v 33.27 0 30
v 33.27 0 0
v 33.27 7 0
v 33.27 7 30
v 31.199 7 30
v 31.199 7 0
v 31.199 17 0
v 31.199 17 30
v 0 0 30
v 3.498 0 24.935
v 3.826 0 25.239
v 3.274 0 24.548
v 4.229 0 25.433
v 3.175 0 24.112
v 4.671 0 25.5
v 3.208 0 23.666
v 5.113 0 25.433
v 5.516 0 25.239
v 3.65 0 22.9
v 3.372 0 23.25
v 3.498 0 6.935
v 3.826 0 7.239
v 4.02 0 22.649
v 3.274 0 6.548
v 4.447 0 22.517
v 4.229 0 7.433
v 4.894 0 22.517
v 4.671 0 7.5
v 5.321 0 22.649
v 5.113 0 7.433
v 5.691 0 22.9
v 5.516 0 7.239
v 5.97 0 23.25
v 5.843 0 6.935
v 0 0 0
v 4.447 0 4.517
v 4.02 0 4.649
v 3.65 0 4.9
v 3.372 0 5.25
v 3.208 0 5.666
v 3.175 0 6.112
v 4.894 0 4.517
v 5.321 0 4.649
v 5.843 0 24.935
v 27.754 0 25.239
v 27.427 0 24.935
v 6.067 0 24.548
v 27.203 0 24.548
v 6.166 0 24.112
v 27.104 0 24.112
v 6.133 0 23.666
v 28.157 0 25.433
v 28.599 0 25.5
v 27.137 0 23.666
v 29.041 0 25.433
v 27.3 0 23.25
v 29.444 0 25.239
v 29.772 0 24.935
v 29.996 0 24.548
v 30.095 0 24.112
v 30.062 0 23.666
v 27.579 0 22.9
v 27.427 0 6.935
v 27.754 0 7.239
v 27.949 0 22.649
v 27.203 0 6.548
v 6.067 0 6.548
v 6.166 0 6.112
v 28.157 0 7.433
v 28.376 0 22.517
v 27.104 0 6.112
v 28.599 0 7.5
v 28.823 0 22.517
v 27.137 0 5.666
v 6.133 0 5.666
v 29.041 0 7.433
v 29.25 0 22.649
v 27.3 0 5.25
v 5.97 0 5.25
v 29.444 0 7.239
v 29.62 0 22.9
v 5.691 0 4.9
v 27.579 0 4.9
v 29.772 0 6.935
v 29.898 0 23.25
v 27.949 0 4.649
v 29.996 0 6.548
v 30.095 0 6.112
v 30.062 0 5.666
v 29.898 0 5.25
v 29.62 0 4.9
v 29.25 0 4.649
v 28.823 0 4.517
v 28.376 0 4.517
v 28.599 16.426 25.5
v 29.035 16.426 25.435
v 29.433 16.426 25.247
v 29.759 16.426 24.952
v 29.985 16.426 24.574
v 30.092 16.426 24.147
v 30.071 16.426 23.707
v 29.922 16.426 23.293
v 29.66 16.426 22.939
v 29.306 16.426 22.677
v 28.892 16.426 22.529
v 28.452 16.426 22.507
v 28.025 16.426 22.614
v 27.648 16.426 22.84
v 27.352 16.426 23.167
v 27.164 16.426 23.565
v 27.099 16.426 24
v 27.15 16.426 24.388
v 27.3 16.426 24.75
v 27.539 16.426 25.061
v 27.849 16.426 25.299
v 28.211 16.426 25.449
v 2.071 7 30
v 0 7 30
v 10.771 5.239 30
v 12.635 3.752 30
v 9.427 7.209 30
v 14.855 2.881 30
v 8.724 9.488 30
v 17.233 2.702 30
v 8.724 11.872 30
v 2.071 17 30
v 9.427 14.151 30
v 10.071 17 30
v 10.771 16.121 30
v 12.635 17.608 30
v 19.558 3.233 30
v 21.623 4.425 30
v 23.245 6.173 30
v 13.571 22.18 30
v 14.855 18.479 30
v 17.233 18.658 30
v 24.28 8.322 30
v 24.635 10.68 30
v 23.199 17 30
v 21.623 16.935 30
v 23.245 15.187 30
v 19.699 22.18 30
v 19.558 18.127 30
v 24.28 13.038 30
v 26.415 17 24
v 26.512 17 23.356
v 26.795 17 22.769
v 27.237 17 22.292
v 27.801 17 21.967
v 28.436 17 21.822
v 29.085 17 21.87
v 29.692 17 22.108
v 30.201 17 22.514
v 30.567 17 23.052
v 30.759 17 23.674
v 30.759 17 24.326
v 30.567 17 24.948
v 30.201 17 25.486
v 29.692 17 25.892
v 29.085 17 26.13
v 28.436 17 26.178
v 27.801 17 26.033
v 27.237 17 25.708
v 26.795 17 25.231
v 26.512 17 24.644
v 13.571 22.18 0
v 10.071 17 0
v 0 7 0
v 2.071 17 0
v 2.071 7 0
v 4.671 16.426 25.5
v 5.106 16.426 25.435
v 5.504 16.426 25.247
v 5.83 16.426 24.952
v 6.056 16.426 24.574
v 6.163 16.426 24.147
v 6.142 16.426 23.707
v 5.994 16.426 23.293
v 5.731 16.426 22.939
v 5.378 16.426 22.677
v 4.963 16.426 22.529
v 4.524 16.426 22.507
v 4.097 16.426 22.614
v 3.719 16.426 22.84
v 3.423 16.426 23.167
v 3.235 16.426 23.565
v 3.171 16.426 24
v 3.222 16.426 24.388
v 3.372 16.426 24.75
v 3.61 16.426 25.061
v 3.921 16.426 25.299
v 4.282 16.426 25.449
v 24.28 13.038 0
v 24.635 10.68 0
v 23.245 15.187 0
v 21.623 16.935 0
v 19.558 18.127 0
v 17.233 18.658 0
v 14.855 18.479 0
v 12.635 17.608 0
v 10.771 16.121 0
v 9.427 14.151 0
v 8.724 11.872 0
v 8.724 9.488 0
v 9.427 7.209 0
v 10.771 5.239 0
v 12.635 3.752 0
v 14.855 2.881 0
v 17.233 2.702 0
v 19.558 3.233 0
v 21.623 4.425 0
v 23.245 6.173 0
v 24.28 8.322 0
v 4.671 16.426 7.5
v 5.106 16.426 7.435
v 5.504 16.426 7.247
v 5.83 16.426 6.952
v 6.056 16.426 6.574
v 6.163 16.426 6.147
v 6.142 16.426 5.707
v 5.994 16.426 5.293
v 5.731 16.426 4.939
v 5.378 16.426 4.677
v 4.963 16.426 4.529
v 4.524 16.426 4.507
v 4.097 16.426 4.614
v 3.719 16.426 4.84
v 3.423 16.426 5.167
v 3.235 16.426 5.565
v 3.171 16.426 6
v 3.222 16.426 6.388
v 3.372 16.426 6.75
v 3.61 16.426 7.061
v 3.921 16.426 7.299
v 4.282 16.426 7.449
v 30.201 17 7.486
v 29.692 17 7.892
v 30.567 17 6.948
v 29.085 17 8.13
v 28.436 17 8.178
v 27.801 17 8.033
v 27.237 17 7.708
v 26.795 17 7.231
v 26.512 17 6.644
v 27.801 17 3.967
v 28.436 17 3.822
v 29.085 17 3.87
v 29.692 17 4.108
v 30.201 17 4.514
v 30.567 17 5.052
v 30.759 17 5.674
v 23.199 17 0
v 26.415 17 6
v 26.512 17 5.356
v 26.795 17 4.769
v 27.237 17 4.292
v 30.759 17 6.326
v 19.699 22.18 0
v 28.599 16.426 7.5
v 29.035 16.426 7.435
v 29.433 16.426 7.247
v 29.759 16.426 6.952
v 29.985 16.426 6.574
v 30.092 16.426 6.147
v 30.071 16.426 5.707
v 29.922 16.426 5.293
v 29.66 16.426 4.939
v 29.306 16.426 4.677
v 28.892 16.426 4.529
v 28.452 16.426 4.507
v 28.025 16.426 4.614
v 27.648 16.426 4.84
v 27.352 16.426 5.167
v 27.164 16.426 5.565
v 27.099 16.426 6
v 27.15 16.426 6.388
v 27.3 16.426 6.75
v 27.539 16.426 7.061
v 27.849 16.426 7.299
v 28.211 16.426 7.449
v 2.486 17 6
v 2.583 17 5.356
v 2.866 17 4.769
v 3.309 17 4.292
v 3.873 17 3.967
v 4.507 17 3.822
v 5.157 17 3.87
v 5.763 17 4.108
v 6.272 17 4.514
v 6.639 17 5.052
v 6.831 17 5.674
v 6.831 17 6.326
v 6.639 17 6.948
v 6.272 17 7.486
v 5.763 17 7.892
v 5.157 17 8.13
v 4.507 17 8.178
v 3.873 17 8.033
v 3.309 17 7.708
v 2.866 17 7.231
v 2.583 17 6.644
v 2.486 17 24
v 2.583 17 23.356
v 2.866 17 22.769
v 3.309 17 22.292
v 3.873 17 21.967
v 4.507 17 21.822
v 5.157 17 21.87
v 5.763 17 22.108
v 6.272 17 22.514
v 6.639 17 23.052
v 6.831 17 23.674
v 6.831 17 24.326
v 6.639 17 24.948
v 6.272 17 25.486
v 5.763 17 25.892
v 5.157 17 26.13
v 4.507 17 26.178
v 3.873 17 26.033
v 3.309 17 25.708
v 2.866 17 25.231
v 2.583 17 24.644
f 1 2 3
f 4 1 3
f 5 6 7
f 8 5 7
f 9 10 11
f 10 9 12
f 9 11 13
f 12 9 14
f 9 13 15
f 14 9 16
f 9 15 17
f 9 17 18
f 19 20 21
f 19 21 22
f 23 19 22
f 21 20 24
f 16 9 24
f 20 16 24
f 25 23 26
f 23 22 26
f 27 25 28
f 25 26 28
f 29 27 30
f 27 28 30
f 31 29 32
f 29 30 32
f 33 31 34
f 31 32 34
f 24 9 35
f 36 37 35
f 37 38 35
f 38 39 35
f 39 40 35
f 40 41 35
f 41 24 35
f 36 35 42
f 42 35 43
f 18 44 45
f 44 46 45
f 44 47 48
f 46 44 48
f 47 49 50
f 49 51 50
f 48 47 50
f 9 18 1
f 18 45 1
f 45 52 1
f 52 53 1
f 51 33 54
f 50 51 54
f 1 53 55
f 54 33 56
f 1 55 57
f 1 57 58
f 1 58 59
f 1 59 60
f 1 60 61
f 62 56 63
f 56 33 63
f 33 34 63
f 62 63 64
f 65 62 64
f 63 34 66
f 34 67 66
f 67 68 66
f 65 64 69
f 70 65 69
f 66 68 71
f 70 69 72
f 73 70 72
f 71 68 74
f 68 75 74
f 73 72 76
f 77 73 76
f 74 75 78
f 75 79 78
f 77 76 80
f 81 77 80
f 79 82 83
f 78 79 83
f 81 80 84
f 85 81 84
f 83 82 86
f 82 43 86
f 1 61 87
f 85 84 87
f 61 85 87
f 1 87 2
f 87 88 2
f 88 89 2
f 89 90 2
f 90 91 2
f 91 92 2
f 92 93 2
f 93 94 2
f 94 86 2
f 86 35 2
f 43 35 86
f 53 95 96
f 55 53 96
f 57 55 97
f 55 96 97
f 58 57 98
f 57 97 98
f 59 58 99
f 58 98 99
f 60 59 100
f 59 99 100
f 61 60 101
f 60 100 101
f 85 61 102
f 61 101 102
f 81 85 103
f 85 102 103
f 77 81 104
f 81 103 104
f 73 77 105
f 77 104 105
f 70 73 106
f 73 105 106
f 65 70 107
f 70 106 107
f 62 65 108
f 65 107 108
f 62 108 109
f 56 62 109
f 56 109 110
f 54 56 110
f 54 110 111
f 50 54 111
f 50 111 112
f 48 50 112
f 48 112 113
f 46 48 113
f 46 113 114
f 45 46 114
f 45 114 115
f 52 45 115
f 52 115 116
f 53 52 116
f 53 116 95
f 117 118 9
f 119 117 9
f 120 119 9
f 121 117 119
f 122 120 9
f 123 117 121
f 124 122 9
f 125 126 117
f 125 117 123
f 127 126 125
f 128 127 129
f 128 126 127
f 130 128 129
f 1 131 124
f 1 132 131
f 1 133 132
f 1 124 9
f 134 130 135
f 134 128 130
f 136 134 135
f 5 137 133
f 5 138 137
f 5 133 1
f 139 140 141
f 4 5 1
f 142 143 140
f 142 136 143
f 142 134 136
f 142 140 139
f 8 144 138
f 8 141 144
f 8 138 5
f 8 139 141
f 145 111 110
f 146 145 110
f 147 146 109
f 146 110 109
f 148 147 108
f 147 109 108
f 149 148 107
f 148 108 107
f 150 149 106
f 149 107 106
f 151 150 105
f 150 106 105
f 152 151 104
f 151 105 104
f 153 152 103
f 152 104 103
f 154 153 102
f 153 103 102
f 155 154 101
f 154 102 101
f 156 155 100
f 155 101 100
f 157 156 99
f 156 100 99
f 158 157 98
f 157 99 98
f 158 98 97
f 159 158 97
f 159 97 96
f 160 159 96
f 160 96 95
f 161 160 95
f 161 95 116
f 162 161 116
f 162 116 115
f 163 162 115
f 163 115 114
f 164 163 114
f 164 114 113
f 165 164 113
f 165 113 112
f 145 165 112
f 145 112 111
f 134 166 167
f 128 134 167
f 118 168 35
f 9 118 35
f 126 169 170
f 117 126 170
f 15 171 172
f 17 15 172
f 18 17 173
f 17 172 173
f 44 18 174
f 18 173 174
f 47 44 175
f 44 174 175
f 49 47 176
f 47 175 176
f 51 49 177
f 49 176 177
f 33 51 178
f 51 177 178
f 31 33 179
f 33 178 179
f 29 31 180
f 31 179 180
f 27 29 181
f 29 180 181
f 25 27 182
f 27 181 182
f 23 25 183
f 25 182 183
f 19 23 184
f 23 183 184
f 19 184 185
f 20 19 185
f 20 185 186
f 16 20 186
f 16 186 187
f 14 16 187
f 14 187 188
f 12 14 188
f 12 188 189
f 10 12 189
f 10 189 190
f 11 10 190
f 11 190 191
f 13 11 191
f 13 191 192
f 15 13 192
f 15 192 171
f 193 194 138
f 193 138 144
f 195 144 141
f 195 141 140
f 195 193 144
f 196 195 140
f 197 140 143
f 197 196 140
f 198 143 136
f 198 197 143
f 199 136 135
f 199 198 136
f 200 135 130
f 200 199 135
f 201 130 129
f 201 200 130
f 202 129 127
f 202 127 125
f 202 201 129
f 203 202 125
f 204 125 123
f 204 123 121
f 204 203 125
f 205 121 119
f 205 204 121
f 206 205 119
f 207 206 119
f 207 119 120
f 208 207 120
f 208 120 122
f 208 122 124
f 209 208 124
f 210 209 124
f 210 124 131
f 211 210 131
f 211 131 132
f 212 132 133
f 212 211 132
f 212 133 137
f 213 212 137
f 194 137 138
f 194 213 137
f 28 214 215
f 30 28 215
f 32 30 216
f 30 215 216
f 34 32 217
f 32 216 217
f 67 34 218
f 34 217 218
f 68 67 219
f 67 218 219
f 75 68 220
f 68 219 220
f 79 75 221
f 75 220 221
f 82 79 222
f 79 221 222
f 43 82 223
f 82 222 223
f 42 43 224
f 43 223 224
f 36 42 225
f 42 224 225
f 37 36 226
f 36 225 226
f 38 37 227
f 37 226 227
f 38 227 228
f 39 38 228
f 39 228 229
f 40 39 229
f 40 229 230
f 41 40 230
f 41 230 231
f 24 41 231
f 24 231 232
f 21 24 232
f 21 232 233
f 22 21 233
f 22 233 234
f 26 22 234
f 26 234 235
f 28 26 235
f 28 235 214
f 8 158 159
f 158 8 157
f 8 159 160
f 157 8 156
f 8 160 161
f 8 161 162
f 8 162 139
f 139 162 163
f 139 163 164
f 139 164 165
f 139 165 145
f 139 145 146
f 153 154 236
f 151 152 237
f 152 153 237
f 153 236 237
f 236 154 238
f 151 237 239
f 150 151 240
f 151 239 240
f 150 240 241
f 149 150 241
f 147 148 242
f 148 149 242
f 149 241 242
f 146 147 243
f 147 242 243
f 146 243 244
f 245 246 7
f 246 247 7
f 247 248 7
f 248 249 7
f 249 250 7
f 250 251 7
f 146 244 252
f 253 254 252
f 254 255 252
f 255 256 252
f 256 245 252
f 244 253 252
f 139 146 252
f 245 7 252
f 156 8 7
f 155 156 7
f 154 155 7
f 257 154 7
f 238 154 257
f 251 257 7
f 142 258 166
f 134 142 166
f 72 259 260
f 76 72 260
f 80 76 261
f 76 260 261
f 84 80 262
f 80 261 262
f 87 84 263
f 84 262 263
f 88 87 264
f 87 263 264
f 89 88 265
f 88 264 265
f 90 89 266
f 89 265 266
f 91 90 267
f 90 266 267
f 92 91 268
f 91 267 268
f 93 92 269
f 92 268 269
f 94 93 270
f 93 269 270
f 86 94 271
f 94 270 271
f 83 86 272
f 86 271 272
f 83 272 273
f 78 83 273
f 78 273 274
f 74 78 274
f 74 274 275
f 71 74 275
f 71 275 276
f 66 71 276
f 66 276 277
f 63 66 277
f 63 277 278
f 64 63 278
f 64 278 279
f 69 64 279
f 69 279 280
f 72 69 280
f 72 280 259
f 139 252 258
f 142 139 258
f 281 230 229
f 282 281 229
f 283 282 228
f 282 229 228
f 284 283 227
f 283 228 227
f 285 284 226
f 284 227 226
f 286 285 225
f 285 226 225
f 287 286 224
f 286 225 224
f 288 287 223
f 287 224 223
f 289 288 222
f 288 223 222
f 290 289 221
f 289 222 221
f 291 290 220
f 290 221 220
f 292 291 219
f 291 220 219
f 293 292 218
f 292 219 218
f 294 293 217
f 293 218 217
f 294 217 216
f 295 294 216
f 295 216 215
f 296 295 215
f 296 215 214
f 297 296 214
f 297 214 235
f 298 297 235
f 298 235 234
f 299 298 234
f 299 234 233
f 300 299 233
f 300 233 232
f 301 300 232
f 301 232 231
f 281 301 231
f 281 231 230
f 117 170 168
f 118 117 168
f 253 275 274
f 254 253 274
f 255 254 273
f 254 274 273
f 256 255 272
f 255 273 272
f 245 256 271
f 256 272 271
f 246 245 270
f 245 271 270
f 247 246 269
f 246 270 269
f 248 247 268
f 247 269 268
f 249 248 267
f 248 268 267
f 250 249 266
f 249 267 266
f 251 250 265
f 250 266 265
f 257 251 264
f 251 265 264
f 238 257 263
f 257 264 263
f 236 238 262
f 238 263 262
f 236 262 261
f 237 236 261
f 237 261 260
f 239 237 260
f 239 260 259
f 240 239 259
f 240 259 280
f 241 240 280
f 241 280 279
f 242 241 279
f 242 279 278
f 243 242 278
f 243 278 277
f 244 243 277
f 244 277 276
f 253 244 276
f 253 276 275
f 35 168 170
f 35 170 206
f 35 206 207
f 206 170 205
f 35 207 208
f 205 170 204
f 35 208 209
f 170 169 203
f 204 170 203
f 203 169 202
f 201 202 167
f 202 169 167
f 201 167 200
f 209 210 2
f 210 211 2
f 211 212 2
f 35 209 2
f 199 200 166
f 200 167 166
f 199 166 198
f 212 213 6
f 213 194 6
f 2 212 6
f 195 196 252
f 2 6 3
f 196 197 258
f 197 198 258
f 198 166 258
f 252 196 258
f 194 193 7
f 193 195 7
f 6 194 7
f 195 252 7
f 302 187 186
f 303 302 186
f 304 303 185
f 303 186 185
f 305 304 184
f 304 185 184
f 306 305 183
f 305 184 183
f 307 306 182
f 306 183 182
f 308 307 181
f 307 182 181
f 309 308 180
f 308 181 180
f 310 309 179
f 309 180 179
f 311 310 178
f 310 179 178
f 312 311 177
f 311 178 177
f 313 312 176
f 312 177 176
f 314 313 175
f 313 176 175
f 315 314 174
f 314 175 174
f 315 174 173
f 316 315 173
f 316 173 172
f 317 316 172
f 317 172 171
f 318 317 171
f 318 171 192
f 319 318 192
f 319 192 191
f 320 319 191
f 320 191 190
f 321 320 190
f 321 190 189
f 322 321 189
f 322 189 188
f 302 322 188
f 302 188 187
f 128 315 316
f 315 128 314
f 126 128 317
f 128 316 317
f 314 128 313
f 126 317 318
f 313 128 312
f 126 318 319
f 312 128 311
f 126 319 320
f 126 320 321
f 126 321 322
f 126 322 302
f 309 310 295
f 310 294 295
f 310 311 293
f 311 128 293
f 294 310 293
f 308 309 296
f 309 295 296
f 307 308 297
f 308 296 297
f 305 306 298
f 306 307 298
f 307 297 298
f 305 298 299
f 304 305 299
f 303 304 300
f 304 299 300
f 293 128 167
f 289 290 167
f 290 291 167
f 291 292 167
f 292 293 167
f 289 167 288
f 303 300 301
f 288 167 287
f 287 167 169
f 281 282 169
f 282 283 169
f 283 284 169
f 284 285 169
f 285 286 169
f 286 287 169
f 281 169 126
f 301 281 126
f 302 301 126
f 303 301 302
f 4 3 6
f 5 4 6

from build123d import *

# Parameters (mm, degrees)
SKETCH1_R                                         = 8
BOSS_EXTRUDE1_DEPTH                               = 30
SKETCH2_R                                         = 1.5
CUT_EXTRUDE2_DEPTH                                = 30
CSK_FOR_2_FLAT_HEAD_MACHINE_SCREW_100_D           = 2.7051
CSK_FOR_2_FLAT_HEAD_MACHINE_SCREW_100_CSINK_D     = 4.3688
CSK_FOR_2_FLAT_HEAD_MACHINE_SCREW_100_CSINK_ANGLE = 100
CSK_FOR_2_FLAT_HEAD_MACHINE_SCREW_2_D             = 2.7051
CSK_FOR_2_FLAT_HEAD_MACHINE_SCREW_2_CSINK_D       = 4.3688
CSK_FOR_2_FLAT_HEAD_MACHINE_SCREW_2_CSINK_ANGLE   = 100
CSK_FOR_2_FLAT_HEAD_MACHINE_SCREW_3_D             = 2.7051
CSK_FOR_2_FLAT_HEAD_MACHINE_SCREW_3_CSINK_D       = 4.3688
CSK_FOR_2_FLAT_HEAD_MACHINE_SCREW_3_CSINK_ANGLE   = 100
CSK_FOR_2_FLAT_HEAD_MACHINE_SCREW_4_D             = 2.7051
CSK_FOR_2_FLAT_HEAD_MACHINE_SCREW_4_CSINK_D       = 4.3688
CSK_FOR_2_FLAT_HEAD_MACHINE_SCREW_4_CSINK_ANGLE   = 100


with BuildPart() as part:
    # Sketch1 → Boss-Extrude1 (new body)
    with BuildSketch(Plane.XY):
        Polygon((33.27, 7), (31.19936412, 7), (31.19936412, 17), (23.19936412, 17), (19.69936412, 22.18), (13.57063588, 22.18), (10.07063588, 17), (2.07063588, 17), (2.07063588, 7), (0, 7), (0, 0), (33.27, 0), align=None)
        with Locations((16.635, 10.68)):
            Circle(SKETCH1_R, mode=Mode.SUBTRACT)
    extrude(amount=BOSS_EXTRUDE1_DEPTH)

    # Sketch2 → Cut-Extrude2 (cut)
    with BuildSketch(Plane(origin=(0, 17, 0), x_dir=(1, 0, 0), z_dir=(0, 1, 0))):
        with Locations(Location((28.59936412, -6, 0), (0, 0, 270))):
            Circle(SKETCH2_R)
        with Locations(Location((28.59936412, -24, 0), (0, 0, 270))):
            Circle(SKETCH2_R)
        with Locations(Location((4.67063588, -24, 0), (0, 0, 270))):
            Circle(SKETCH2_R)
        with Locations(Location((4.67063588, -6, 0), (0, 0, 270))):
            Circle(SKETCH2_R)
    extrude(amount=-CUT_EXTRUDE2_DEPTH, mode=Mode.SUBTRACT)

    # CSK for _2 Flat Head Machine Screw _100 (through all)
    with Locations(Plane(origin=(0, 17, 0), x_dir=(1, 0, 0), z_dir=(0, 1, 0))):
        with Locations((4.67063588, -6)):
            CounterSinkHole(CSK_FOR_2_FLAT_HEAD_MACHINE_SCREW_100_D / 2, CSK_FOR_2_FLAT_HEAD_MACHINE_SCREW_100_CSINK_D / 2, counter_sink_angle=CSK_FOR_2_FLAT_HEAD_MACHINE_SCREW_100_CSINK_ANGLE)

    # CSK for _2 Flat Head Machine Screw _ 2 (through all)
    with Locations(Plane(origin=(0, 17, 0), x_dir=(1, 0, 0), z_dir=(0, 1, 0))):
        with Locations((4.67063588, -24)):
            CounterSinkHole(CSK_FOR_2_FLAT_HEAD_MACHINE_SCREW_2_D / 2, CSK_FOR_2_FLAT_HEAD_MACHINE_SCREW_2_CSINK_D / 2, counter_sink_angle=CSK_FOR_2_FLAT_HEAD_MACHINE_SCREW_2_CSINK_ANGLE)

    # CSK for _2 Flat Head Machine Screw _ 3 (through all)
    with Locations(Plane(origin=(0, 17, 0), x_dir=(1, 0, 0), z_dir=(0, 1, 0))):
        with Locations((28.59936412, -6)):
            CounterSinkHole(CSK_FOR_2_FLAT_HEAD_MACHINE_SCREW_3_D / 2, CSK_FOR_2_FLAT_HEAD_MACHINE_SCREW_3_CSINK_D / 2, counter_sink_angle=CSK_FOR_2_FLAT_HEAD_MACHINE_SCREW_3_CSINK_ANGLE)

    # CSK for _2 Flat Head Machine Screw _ 4 (through all)
    with Locations(Plane(origin=(0, 17, 0), x_dir=(1, 0, 0), z_dir=(0, 1, 0))):
        with Locations((28.59936412, -24)):
            CounterSinkHole(CSK_FOR_2_FLAT_HEAD_MACHINE_SCREW_4_D / 2, CSK_FOR_2_FLAT_HEAD_MACHINE_SCREW_4_CSINK_D / 2, counter_sink_angle=CSK_FOR_2_FLAT_HEAD_MACHINE_SCREW_4_CSINK_ANGLE)


solid = part.part
